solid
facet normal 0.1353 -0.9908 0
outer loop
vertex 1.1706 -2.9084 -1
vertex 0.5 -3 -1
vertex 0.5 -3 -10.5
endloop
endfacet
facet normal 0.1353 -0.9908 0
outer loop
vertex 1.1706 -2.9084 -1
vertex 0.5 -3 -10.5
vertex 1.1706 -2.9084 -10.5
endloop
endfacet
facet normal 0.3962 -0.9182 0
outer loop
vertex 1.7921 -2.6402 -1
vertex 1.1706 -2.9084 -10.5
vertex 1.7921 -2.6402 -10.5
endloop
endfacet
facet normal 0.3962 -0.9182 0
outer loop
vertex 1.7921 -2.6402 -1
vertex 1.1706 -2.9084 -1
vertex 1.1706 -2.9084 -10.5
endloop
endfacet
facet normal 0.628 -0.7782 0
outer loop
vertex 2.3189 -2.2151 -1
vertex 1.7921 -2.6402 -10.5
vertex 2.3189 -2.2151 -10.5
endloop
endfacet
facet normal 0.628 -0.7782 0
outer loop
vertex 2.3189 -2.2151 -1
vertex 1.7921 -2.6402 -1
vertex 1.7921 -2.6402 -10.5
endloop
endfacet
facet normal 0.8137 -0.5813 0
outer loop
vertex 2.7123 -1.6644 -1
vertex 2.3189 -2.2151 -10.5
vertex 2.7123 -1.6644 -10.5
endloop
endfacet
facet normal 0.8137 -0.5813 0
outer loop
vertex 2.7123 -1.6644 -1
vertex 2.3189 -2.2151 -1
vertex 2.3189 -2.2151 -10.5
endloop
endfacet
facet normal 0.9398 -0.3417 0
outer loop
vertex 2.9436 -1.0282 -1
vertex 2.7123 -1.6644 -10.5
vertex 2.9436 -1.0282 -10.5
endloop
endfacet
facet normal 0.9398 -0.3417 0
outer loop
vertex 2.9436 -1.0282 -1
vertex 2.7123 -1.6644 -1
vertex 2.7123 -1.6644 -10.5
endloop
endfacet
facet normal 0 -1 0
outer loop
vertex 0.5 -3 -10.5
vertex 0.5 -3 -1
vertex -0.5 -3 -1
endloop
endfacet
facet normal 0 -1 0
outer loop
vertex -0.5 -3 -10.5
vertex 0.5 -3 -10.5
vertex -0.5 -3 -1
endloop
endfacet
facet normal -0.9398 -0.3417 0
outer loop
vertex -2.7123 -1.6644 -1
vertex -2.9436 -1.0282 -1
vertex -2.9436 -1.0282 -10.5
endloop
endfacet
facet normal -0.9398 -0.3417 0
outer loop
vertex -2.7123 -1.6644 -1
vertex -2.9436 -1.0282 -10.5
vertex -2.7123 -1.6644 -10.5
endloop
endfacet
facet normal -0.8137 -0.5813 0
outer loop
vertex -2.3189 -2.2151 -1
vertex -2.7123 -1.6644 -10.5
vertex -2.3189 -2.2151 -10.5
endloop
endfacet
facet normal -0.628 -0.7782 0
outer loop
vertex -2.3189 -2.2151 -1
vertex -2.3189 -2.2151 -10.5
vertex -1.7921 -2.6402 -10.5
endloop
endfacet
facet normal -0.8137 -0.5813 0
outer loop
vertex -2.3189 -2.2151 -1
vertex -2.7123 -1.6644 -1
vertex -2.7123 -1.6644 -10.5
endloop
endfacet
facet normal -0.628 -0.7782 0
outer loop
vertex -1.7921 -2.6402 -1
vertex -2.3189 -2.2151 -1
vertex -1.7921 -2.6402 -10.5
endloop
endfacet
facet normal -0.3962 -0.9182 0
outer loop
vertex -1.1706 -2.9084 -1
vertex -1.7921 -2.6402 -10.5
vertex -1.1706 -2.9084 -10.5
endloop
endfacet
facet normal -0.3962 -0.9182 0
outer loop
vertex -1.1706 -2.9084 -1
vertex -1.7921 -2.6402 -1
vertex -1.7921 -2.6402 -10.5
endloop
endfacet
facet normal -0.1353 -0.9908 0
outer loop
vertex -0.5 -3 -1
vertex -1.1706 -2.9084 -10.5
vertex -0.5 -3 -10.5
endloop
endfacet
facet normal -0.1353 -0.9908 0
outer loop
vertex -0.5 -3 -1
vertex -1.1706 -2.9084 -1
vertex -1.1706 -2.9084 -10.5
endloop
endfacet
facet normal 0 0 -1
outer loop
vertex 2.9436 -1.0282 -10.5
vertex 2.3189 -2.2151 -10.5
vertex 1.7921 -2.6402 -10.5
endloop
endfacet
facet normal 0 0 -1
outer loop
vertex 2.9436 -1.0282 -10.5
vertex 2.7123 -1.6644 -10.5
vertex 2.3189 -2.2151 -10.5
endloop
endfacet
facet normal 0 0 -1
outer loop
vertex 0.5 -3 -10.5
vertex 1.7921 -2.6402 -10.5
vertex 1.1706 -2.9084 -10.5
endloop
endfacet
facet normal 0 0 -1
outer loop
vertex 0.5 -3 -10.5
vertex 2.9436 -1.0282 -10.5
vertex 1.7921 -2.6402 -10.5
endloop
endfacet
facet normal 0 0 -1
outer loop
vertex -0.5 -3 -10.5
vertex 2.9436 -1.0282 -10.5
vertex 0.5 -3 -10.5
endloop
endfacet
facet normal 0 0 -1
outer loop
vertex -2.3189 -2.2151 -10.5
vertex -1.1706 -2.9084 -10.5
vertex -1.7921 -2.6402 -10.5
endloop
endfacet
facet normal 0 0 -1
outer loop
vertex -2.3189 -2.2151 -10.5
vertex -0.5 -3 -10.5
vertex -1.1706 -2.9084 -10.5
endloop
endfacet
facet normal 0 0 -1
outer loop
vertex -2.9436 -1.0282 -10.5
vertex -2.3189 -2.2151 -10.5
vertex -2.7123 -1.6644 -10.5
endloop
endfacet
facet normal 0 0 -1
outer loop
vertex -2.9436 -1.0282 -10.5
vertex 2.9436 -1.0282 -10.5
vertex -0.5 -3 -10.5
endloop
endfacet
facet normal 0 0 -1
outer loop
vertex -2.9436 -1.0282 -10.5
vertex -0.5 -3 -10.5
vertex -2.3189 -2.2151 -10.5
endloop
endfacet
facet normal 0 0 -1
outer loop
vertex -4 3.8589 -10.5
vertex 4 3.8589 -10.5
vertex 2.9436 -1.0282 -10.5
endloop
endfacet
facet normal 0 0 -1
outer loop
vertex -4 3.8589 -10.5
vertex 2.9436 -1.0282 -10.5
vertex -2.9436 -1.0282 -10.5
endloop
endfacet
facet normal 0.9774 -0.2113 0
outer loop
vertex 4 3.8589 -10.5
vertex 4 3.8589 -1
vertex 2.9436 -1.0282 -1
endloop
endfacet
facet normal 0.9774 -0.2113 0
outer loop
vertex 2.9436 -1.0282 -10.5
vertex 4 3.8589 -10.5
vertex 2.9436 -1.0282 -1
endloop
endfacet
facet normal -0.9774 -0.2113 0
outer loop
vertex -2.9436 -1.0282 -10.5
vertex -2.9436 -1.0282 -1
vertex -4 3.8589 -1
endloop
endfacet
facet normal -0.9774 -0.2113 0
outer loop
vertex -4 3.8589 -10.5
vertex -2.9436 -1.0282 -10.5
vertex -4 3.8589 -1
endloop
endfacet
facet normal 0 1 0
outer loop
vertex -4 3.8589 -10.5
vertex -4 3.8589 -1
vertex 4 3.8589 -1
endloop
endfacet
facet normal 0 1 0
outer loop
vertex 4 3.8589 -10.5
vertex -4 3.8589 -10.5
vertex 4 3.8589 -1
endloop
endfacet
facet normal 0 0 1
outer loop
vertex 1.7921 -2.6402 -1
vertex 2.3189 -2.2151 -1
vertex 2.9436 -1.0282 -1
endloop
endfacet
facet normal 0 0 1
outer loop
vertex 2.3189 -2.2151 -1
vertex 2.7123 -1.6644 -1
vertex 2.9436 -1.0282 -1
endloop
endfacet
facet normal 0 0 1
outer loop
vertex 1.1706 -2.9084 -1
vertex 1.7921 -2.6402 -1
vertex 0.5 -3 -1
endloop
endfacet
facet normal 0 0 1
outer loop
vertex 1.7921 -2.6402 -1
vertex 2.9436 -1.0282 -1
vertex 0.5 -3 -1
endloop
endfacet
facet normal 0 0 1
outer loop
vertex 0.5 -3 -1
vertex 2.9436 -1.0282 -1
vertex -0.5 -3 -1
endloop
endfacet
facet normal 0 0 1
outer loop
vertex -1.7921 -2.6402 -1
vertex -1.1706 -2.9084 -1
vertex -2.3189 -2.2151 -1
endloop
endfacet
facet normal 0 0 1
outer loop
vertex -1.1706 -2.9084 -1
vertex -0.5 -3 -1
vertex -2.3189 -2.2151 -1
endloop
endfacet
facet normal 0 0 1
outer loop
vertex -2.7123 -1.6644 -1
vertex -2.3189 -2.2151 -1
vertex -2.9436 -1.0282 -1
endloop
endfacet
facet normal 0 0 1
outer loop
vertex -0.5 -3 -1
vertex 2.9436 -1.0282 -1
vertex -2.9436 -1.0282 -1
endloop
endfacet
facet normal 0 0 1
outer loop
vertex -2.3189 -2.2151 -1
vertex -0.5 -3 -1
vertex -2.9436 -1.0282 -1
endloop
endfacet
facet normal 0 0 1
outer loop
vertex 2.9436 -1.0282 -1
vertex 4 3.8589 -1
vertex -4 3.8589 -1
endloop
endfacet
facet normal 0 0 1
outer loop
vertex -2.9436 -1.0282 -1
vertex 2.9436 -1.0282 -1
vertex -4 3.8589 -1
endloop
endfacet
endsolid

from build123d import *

# Parameters (mm, degrees)
PAD009_DEPTH = 9.5


with BuildPart() as part:
    # Sketch018 → Pad009 (new body)
    with BuildSketch(Plane.XY.offset(-1)):
        with BuildLine():
            Line((-4, 3.858899), (4, 3.858899))
            Line((4, 3.858899), (2.94356, -1.02822))
            ThreePointArc((0.5, -3), (2.069944, -2.445578), (2.94356, -1.02822))
            Line((0.5, -3), (-0.5, -3))
            ThreePointArc((-2.94356, -1.02822), (-2.069944, -2.445578), (-0.5, -3))
            Line((-2.94356, -1.02822), (-4, 3.858899))
        make_face()
    extrude(amount=-PAD009_DEPTH)


solid = part.part
